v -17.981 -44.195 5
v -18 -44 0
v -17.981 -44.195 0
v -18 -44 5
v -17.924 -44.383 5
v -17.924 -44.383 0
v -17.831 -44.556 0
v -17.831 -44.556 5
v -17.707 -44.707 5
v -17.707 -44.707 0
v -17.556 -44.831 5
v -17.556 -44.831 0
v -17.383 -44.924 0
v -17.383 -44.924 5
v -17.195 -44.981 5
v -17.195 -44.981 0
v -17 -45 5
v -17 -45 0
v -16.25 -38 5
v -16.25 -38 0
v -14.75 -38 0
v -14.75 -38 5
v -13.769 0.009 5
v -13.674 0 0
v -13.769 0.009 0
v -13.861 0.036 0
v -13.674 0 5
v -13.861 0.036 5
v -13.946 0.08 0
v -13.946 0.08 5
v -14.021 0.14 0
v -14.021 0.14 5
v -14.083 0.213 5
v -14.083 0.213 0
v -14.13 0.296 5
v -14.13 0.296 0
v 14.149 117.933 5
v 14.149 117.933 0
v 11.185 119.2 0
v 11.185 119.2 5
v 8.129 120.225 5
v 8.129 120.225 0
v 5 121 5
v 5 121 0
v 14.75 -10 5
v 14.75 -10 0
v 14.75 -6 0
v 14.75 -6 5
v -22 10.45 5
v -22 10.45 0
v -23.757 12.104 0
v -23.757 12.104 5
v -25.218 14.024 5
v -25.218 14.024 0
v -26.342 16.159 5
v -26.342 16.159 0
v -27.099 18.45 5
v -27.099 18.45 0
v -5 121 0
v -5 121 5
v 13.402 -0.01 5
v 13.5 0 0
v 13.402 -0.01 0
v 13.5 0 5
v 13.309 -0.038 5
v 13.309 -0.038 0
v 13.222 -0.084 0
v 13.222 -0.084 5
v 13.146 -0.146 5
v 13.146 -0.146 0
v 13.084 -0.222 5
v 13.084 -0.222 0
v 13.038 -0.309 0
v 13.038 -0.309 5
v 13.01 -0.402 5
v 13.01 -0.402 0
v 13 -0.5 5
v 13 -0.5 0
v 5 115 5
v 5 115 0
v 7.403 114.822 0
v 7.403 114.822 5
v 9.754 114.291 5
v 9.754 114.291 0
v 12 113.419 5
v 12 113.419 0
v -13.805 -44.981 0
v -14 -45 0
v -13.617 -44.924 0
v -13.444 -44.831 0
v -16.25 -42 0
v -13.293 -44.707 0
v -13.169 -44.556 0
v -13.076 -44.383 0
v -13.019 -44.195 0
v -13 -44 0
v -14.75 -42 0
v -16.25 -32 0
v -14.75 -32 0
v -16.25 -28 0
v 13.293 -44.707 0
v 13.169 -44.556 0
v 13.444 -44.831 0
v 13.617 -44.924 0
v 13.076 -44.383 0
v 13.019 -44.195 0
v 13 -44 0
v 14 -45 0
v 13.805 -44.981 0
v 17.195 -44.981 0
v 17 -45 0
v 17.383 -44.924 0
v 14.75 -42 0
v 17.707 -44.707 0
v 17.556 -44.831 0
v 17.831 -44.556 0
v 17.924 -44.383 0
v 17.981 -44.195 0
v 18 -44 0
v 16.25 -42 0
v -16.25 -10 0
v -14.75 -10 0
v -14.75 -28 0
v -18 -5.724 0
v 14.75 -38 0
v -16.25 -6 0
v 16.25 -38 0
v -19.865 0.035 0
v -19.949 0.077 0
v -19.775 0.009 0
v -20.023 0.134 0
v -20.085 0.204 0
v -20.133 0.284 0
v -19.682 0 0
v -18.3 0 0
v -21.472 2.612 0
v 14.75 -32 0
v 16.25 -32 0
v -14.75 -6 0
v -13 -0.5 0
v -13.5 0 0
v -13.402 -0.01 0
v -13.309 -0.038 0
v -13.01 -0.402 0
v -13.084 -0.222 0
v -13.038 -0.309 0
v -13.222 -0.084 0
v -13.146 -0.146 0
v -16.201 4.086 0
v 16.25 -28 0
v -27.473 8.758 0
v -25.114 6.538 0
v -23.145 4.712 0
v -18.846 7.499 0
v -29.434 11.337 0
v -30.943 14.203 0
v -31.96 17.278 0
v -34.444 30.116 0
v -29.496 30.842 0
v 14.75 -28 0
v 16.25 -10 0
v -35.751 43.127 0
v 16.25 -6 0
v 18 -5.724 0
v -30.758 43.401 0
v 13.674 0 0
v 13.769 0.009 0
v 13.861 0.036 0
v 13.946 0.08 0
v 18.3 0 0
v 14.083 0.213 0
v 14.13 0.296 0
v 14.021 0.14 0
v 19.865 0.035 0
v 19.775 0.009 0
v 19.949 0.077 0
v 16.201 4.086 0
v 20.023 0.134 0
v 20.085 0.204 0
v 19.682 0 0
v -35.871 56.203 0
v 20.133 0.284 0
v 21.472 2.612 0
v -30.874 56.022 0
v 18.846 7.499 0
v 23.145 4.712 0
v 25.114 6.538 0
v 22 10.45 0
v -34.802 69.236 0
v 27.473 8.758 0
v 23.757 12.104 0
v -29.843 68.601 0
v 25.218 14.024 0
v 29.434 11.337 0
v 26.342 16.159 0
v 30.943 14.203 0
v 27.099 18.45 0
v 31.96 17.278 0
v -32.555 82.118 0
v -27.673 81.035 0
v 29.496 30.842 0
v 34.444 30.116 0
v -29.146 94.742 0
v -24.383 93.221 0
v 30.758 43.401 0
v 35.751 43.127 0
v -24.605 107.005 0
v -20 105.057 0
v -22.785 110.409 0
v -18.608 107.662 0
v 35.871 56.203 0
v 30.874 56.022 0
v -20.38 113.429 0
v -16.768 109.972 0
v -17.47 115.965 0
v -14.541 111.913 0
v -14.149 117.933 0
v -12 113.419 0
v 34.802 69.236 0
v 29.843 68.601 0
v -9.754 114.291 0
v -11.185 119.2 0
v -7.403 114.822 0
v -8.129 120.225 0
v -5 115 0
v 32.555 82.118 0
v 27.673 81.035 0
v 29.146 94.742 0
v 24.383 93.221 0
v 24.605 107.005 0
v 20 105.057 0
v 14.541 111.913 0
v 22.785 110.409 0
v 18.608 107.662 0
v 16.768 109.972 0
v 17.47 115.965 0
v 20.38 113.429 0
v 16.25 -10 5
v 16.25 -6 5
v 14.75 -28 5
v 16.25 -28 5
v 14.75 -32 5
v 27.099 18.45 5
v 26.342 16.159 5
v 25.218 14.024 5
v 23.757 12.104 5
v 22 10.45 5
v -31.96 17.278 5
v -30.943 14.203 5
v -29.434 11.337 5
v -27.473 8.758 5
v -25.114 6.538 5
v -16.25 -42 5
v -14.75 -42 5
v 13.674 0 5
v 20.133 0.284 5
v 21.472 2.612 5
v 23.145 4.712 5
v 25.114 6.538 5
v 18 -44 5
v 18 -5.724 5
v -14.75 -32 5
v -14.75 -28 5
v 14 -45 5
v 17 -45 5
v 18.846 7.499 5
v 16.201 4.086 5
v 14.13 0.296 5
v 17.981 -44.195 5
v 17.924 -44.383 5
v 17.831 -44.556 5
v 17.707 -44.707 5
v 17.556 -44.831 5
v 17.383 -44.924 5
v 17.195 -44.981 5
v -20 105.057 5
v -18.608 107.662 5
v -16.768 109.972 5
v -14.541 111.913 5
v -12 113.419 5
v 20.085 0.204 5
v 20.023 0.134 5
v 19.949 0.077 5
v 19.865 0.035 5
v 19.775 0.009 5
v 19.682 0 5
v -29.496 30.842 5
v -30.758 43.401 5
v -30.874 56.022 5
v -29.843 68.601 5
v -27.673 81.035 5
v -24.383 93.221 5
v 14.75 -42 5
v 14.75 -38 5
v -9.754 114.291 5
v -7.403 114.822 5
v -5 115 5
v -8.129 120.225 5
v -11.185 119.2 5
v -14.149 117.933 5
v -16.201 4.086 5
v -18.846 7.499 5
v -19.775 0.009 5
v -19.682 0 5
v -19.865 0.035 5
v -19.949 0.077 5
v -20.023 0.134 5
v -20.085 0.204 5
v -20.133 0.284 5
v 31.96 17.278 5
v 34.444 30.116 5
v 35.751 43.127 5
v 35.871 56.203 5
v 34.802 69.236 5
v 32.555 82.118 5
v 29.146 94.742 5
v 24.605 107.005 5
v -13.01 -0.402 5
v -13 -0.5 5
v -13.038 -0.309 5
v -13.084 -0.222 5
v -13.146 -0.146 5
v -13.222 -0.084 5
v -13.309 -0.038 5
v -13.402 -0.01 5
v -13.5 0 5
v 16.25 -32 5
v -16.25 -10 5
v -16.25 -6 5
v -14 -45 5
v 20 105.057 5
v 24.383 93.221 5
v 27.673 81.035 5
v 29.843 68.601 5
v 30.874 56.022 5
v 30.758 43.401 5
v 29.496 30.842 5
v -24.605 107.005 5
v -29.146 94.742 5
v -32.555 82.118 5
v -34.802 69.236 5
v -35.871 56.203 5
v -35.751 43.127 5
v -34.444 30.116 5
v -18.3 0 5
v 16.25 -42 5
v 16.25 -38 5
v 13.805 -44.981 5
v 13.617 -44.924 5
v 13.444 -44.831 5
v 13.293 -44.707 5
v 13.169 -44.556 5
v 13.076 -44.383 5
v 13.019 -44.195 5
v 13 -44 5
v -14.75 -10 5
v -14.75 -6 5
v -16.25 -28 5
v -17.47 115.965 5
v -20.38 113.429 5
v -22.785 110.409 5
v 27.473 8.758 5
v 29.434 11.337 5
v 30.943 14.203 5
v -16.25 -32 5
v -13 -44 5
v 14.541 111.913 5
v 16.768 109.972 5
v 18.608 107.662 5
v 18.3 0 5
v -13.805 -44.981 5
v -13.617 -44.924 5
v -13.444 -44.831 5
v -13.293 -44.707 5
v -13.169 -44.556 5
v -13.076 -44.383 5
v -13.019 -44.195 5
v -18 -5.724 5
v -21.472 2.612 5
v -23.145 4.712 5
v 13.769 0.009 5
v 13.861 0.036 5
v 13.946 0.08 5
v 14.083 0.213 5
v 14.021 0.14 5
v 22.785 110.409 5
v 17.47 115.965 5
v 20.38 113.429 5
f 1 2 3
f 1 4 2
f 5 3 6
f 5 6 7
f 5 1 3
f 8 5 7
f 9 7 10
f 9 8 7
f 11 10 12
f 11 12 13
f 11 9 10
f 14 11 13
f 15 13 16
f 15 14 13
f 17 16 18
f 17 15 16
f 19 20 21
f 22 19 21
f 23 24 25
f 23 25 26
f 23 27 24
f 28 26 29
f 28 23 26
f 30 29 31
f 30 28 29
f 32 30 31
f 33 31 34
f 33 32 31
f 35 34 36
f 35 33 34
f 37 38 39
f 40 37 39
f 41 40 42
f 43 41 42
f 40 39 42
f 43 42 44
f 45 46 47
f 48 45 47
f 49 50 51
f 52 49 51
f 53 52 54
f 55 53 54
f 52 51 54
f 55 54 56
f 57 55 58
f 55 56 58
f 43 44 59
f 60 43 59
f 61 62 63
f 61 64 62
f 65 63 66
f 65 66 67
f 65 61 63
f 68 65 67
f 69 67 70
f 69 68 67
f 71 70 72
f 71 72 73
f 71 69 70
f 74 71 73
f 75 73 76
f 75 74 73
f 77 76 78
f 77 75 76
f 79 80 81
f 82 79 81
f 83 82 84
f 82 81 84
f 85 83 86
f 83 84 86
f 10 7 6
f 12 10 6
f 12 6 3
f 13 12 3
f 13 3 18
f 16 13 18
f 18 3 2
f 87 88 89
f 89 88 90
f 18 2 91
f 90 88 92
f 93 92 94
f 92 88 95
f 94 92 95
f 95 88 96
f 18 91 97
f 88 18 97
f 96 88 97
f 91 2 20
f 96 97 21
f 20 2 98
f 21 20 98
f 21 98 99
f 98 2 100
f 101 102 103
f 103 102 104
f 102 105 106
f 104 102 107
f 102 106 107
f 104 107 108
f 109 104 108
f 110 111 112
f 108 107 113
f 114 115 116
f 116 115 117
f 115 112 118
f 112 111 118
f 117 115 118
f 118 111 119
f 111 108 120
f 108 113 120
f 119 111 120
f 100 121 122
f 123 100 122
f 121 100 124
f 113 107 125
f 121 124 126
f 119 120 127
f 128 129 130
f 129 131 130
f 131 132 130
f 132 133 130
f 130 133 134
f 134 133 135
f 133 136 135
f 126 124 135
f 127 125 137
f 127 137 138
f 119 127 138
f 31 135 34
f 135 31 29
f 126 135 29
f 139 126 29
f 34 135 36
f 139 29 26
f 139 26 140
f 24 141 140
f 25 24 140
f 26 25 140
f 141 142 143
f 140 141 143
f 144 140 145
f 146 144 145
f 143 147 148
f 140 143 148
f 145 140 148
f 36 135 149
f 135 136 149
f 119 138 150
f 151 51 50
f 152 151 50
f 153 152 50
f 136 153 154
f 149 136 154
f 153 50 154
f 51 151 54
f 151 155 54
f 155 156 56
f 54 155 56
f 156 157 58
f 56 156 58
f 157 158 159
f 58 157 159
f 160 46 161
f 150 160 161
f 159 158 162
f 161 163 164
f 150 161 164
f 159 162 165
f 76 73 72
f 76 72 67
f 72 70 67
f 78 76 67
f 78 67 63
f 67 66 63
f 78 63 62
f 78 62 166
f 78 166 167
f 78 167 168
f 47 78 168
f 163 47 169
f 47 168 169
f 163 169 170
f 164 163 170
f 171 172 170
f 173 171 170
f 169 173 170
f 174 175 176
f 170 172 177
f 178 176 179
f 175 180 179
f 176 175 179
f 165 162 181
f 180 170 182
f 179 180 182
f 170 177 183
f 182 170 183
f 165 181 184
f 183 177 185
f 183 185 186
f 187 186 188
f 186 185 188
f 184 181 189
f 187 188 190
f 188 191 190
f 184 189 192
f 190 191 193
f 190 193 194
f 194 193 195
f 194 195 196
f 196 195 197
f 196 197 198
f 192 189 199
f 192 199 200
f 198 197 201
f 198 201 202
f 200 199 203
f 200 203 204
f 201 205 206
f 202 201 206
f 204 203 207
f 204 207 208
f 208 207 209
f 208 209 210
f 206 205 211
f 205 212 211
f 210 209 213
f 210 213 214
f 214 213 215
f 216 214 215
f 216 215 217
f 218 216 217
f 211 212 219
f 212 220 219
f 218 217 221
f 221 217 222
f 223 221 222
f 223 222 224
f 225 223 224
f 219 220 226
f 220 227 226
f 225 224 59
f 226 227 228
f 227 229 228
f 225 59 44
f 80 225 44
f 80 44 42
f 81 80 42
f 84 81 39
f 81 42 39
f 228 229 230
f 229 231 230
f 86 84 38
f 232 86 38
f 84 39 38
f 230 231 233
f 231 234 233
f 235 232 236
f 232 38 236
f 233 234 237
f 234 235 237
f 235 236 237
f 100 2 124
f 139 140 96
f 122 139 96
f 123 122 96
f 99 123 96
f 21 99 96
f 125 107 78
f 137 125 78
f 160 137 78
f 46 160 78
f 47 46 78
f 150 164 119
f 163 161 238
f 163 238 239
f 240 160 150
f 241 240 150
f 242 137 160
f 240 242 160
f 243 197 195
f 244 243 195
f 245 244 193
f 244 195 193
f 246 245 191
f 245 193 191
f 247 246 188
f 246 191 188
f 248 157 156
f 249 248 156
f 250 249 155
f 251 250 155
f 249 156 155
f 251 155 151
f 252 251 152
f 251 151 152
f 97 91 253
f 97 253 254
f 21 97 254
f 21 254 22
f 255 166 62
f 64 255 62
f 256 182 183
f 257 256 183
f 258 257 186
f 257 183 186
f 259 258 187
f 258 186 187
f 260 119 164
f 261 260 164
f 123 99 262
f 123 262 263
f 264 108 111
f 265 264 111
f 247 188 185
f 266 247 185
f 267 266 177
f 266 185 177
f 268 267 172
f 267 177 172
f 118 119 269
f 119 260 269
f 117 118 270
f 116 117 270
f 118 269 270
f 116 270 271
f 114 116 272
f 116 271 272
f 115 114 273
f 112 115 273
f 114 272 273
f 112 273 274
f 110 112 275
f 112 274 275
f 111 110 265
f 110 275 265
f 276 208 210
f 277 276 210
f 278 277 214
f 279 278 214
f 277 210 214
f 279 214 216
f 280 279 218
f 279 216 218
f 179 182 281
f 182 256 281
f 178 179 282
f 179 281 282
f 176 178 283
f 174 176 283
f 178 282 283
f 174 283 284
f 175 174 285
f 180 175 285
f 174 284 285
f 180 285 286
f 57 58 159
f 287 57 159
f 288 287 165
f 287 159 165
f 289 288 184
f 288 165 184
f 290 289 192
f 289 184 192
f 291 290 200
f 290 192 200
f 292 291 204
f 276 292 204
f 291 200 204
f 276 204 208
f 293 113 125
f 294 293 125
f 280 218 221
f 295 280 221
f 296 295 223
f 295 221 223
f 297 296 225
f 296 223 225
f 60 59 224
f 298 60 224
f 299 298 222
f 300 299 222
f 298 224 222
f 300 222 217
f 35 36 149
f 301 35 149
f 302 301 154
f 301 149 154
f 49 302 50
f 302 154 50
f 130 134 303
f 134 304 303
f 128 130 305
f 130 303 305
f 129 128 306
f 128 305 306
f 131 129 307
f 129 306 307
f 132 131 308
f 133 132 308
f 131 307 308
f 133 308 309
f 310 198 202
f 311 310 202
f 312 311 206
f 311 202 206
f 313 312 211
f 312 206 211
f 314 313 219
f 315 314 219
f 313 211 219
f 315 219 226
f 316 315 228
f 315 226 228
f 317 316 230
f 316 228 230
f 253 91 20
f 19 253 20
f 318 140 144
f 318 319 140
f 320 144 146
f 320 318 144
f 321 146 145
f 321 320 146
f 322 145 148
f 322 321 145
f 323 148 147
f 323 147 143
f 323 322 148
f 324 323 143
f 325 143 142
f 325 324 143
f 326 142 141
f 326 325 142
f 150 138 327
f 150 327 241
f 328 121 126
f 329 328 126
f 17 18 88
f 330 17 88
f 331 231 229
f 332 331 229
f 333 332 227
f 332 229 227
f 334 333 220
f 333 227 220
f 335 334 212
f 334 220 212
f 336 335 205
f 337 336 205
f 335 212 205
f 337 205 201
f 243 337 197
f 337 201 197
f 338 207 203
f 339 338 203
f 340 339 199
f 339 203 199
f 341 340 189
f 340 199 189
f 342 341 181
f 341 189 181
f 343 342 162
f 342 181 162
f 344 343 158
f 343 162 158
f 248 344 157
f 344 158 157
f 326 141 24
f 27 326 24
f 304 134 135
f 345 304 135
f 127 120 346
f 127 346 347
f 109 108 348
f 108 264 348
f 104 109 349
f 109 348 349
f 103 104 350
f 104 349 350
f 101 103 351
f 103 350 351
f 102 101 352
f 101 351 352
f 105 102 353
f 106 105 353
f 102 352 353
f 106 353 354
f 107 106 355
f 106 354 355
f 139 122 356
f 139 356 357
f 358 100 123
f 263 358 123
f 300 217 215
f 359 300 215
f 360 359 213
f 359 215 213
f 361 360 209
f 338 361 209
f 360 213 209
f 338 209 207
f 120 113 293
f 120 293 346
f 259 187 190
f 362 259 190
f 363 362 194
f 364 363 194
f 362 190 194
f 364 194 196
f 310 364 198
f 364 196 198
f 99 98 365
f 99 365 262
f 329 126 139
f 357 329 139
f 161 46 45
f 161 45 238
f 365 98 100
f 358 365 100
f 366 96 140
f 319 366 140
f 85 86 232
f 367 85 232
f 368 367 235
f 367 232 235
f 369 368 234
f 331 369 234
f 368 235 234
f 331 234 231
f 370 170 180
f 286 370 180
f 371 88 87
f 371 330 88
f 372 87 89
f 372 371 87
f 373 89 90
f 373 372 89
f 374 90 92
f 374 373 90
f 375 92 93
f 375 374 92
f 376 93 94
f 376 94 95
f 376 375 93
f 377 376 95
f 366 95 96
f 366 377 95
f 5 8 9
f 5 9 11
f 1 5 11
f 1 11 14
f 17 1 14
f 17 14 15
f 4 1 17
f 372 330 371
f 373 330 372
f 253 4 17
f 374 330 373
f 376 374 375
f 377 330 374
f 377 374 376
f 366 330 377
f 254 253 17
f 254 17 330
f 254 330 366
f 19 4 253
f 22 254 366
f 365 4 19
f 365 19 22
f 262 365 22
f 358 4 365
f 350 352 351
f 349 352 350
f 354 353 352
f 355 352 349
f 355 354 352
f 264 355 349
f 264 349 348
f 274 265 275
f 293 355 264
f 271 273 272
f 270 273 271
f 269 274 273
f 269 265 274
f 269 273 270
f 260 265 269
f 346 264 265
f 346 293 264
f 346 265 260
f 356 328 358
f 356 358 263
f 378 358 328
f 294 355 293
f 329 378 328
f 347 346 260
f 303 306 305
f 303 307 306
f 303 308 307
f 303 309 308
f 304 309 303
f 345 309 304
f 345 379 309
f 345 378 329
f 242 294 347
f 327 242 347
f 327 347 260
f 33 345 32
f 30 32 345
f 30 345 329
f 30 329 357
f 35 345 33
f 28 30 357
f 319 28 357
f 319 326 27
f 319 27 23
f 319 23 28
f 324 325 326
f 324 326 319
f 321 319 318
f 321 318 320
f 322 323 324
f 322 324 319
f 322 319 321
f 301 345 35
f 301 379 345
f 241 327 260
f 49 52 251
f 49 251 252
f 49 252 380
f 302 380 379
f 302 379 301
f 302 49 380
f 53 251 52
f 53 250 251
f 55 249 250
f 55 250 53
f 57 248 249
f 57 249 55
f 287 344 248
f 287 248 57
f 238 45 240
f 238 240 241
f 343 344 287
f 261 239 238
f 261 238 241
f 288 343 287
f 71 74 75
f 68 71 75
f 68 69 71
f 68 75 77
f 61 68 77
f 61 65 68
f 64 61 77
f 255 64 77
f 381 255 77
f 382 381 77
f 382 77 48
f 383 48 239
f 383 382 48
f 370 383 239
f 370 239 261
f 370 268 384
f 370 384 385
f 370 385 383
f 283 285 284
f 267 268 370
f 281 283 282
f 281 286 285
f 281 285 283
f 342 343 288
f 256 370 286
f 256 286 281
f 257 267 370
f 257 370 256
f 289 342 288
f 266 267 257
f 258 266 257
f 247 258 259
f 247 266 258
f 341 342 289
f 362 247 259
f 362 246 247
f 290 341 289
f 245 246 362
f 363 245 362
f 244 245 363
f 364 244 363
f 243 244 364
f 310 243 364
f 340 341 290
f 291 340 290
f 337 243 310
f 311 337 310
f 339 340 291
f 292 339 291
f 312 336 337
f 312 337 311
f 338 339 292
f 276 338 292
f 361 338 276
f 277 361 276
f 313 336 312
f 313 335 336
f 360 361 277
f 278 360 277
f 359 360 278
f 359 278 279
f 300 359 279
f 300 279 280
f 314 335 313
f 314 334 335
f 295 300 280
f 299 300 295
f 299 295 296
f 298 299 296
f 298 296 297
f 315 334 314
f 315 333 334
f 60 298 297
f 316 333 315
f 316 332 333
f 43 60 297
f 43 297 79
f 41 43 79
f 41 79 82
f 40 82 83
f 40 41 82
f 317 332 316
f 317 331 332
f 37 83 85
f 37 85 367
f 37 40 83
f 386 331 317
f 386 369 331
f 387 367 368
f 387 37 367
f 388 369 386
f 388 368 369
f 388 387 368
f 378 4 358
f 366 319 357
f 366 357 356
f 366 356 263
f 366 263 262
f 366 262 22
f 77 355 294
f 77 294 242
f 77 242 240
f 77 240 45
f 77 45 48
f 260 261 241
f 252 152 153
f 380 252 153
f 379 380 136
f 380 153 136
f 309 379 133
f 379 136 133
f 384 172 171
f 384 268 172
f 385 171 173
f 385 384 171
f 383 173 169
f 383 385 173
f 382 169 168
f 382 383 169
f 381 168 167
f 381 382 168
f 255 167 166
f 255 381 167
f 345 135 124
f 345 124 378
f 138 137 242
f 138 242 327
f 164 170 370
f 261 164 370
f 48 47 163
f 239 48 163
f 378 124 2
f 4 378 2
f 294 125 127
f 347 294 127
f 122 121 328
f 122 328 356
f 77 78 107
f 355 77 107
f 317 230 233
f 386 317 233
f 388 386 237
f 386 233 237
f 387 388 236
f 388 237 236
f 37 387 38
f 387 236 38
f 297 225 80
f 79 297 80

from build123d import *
from OCP.BRepFilletAPI import BRepFilletAPI_MakeChamfer

# Parameters (mm, degrees)
SKETCH1_W           = 1.5
SKETCH1_H           = 4
BOSS_EXTRUDE2_DEPTH = 5
FILLET1_R           = 0.5
CHAMFER1_SIZE       = 0.3
CHAMFER1_SIZE2      = 5.724341006
FILLET2_R           = 1


with BuildPart() as part:
    # Sketch1 → Boss-Extrude2 (new body)
    with BuildSketch(Plane.XY):
        with BuildLine():
            Line((-18, 0), (-18, -45))
            Line((-18, -45), (-13, -45))
            Line((-13, -45), (-13, 0))
            Line((-13, 0), (-14, 0))
            ThreePointArc((-14, 0), (-17.356723571, 5.717389506), (-22, 10.449843403))
            ThreePointArc((-22, 10.449843403), (-25.217580201, 14.024096355), (-27.099300045, 18.449843403))
            ThreePointArc((-27.099300045, 18.449843403), (-30.501361107, 62.323372475), (-20, 105.057223081))
            ThreePointArc((-20, 105.057223081), (-16.767609995, 109.972410851), (-12, 113.418758324))
            ThreePointArc((-12, 113.418758324), (-8.588186354, 114.5997714), (-5, 115))
            Line((-5, 115), (0, 115))
            Line((0, 115), (5, 115))
            ThreePointArc((5, 115), (8.588186354, 114.5997714), (12, 113.418758324))
            ThreePointArc((12, 113.418758324), (16.767609995, 109.972410851), (20, 105.057223081))
            ThreePointArc((20, 105.057223081), (30.501361107, 62.323372475), (27.099300045, 18.449843403))
            ThreePointArc((27.099300045, 18.449843403), (25.217580201, 14.024096355), (22, 10.449843403))
            ThreePointArc((22, 10.449843403), (17.356723571, 5.717389506), (14, 0))
            Line((14, 0), (13, 0))
            Line((13, 0), (13, -45))
            Line((13, -45), (18, -45))
            Line((18, -45), (18, 0))
            Line((18, 0), (20, 0))
            ThreePointArc((20, 0), (22.171979479, 3.570426989), (25.114361701, 6.538225938))
            ThreePointArc((25.114361701, 6.538225938), (29.4338834, 11.336571968), (31.960045669, 17.278027726))
            ThreePointArc((31.960045669, 17.278027726), (35.484647146, 62.731857791), (24.605032643, 107.004958781))
            ThreePointArc((24.605032643, 107.004958781), (20.380385499, 113.428977522), (14.149246958, 117.933261343))
            ThreePointArc((14.149246958, 117.933261343), (9.667432642, 119.743515679), (5, 121))
            Line((5, 121), (-5, 121))
            ThreePointArc((-5, 121), (-9.667432642, 119.743515679), (-14.149246958, 117.933261343))
            ThreePointArc((-14.149246958, 117.933261343), (-20.380385499, 113.428977522), (-24.605032643, 107.004958781))
            ThreePointArc((-24.605032643, 107.004958781), (-35.484647146, 62.731857791), (-31.960045669, 17.278027726))
            ThreePointArc((-31.960045669, 17.278027726), (-29.4338834, 11.336571968), (-25.114361701, 6.538225938))
            ThreePointArc((-25.114361701, 6.538225938), (-22.171979479, 3.570426989), (-20, 0))
            Line((-20, 0), (-18, 0))
        make_face()
        with Locations((15.5, -8)):
            Rectangle(SKETCH1_W, SKETCH1_H, mode=Mode.SUBTRACT)
        with Locations((-15.5, -40)):
            Rectangle(SKETCH1_W, SKETCH1_H, mode=Mode.SUBTRACT)
        with Locations((15.5, -40)):
            Rectangle(SKETCH1_W, SKETCH1_H, mode=Mode.SUBTRACT)
        with Locations((-15.5, -8)):
            Rectangle(SKETCH1_W, SKETCH1_H, mode=Mode.SUBTRACT)
        with Locations((-15.5, -30)):
            Rectangle(SKETCH1_W, SKETCH1_H, mode=Mode.SUBTRACT)
        with Locations((15.5, -30)):
            Rectangle(SKETCH1_W, SKETCH1_H, mode=Mode.SUBTRACT)
    extrude(amount=BOSS_EXTRUDE2_DEPTH)

    # Fillet1
    fillet1_edges = [part.edges().sort_by_distance(p)[0] for p in [
        (-20, 0, 2.5),
        (20, 0, 2.5),
        (13, 0, 2.5),
        (14, 0, 2.5),
        (-14, 0, 2.5),
        (-13, 0, 2.5),
    ]]
    fillet(fillet1_edges, radius=FILLET1_R)

    # Chamfer1: one chamfer whose edges measure the first distance from different faces: ONE call of the kernel's chamfer builder (chamfer() names one face for all edges)
    chamfer1_edges_1 = [part.edges().sort_by_distance(p)[0] for p in [
        (-18, 0, 2.5),
    ]]
    chamfer1_side_1 = [part.faces().sort_by_distance(p)[0] for p in [
        (-18.841037528, 0, 2.5),
    ]]
    chamfer1_edges_2 = [part.edges().sort_by_distance(p)[0] for p in [
        (18, 0, 2.5),
    ]]
    chamfer1_side_2 = [part.faces().sort_by_distance(p)[0] for p in [
        (18.841037528, 0, 2.5),
    ]]
    chamfer1 = BRepFilletAPI_MakeChamfer(part.part.solid().wrapped)
    for e in chamfer1_edges_1:
        chamfer1.Add(CHAMFER1_SIZE, CHAMFER1_SIZE2, e.wrapped, chamfer1_side_1[0].wrapped)  # the first distance lies on this face
    for e in chamfer1_edges_2:
        chamfer1.Add(CHAMFER1_SIZE, CHAMFER1_SIZE2, e.wrapped, chamfer1_side_2[0].wrapped)  # the first distance lies on this face
    add(Compound.cast(chamfer1.Shape()), mode=Mode.REPLACE)

    # Fillet2
    fillet2_edges = [part.edges().sort_by_distance(p)[0] for p in [
        (-13, -45, 2.5),
        (-18, -45, 2.5),
        (18, -45, 2.5),
        (13, -45, 2.5),
    ]]
    fillet(fillet2_edges, radius=FILLET2_R)


solid = part.part
